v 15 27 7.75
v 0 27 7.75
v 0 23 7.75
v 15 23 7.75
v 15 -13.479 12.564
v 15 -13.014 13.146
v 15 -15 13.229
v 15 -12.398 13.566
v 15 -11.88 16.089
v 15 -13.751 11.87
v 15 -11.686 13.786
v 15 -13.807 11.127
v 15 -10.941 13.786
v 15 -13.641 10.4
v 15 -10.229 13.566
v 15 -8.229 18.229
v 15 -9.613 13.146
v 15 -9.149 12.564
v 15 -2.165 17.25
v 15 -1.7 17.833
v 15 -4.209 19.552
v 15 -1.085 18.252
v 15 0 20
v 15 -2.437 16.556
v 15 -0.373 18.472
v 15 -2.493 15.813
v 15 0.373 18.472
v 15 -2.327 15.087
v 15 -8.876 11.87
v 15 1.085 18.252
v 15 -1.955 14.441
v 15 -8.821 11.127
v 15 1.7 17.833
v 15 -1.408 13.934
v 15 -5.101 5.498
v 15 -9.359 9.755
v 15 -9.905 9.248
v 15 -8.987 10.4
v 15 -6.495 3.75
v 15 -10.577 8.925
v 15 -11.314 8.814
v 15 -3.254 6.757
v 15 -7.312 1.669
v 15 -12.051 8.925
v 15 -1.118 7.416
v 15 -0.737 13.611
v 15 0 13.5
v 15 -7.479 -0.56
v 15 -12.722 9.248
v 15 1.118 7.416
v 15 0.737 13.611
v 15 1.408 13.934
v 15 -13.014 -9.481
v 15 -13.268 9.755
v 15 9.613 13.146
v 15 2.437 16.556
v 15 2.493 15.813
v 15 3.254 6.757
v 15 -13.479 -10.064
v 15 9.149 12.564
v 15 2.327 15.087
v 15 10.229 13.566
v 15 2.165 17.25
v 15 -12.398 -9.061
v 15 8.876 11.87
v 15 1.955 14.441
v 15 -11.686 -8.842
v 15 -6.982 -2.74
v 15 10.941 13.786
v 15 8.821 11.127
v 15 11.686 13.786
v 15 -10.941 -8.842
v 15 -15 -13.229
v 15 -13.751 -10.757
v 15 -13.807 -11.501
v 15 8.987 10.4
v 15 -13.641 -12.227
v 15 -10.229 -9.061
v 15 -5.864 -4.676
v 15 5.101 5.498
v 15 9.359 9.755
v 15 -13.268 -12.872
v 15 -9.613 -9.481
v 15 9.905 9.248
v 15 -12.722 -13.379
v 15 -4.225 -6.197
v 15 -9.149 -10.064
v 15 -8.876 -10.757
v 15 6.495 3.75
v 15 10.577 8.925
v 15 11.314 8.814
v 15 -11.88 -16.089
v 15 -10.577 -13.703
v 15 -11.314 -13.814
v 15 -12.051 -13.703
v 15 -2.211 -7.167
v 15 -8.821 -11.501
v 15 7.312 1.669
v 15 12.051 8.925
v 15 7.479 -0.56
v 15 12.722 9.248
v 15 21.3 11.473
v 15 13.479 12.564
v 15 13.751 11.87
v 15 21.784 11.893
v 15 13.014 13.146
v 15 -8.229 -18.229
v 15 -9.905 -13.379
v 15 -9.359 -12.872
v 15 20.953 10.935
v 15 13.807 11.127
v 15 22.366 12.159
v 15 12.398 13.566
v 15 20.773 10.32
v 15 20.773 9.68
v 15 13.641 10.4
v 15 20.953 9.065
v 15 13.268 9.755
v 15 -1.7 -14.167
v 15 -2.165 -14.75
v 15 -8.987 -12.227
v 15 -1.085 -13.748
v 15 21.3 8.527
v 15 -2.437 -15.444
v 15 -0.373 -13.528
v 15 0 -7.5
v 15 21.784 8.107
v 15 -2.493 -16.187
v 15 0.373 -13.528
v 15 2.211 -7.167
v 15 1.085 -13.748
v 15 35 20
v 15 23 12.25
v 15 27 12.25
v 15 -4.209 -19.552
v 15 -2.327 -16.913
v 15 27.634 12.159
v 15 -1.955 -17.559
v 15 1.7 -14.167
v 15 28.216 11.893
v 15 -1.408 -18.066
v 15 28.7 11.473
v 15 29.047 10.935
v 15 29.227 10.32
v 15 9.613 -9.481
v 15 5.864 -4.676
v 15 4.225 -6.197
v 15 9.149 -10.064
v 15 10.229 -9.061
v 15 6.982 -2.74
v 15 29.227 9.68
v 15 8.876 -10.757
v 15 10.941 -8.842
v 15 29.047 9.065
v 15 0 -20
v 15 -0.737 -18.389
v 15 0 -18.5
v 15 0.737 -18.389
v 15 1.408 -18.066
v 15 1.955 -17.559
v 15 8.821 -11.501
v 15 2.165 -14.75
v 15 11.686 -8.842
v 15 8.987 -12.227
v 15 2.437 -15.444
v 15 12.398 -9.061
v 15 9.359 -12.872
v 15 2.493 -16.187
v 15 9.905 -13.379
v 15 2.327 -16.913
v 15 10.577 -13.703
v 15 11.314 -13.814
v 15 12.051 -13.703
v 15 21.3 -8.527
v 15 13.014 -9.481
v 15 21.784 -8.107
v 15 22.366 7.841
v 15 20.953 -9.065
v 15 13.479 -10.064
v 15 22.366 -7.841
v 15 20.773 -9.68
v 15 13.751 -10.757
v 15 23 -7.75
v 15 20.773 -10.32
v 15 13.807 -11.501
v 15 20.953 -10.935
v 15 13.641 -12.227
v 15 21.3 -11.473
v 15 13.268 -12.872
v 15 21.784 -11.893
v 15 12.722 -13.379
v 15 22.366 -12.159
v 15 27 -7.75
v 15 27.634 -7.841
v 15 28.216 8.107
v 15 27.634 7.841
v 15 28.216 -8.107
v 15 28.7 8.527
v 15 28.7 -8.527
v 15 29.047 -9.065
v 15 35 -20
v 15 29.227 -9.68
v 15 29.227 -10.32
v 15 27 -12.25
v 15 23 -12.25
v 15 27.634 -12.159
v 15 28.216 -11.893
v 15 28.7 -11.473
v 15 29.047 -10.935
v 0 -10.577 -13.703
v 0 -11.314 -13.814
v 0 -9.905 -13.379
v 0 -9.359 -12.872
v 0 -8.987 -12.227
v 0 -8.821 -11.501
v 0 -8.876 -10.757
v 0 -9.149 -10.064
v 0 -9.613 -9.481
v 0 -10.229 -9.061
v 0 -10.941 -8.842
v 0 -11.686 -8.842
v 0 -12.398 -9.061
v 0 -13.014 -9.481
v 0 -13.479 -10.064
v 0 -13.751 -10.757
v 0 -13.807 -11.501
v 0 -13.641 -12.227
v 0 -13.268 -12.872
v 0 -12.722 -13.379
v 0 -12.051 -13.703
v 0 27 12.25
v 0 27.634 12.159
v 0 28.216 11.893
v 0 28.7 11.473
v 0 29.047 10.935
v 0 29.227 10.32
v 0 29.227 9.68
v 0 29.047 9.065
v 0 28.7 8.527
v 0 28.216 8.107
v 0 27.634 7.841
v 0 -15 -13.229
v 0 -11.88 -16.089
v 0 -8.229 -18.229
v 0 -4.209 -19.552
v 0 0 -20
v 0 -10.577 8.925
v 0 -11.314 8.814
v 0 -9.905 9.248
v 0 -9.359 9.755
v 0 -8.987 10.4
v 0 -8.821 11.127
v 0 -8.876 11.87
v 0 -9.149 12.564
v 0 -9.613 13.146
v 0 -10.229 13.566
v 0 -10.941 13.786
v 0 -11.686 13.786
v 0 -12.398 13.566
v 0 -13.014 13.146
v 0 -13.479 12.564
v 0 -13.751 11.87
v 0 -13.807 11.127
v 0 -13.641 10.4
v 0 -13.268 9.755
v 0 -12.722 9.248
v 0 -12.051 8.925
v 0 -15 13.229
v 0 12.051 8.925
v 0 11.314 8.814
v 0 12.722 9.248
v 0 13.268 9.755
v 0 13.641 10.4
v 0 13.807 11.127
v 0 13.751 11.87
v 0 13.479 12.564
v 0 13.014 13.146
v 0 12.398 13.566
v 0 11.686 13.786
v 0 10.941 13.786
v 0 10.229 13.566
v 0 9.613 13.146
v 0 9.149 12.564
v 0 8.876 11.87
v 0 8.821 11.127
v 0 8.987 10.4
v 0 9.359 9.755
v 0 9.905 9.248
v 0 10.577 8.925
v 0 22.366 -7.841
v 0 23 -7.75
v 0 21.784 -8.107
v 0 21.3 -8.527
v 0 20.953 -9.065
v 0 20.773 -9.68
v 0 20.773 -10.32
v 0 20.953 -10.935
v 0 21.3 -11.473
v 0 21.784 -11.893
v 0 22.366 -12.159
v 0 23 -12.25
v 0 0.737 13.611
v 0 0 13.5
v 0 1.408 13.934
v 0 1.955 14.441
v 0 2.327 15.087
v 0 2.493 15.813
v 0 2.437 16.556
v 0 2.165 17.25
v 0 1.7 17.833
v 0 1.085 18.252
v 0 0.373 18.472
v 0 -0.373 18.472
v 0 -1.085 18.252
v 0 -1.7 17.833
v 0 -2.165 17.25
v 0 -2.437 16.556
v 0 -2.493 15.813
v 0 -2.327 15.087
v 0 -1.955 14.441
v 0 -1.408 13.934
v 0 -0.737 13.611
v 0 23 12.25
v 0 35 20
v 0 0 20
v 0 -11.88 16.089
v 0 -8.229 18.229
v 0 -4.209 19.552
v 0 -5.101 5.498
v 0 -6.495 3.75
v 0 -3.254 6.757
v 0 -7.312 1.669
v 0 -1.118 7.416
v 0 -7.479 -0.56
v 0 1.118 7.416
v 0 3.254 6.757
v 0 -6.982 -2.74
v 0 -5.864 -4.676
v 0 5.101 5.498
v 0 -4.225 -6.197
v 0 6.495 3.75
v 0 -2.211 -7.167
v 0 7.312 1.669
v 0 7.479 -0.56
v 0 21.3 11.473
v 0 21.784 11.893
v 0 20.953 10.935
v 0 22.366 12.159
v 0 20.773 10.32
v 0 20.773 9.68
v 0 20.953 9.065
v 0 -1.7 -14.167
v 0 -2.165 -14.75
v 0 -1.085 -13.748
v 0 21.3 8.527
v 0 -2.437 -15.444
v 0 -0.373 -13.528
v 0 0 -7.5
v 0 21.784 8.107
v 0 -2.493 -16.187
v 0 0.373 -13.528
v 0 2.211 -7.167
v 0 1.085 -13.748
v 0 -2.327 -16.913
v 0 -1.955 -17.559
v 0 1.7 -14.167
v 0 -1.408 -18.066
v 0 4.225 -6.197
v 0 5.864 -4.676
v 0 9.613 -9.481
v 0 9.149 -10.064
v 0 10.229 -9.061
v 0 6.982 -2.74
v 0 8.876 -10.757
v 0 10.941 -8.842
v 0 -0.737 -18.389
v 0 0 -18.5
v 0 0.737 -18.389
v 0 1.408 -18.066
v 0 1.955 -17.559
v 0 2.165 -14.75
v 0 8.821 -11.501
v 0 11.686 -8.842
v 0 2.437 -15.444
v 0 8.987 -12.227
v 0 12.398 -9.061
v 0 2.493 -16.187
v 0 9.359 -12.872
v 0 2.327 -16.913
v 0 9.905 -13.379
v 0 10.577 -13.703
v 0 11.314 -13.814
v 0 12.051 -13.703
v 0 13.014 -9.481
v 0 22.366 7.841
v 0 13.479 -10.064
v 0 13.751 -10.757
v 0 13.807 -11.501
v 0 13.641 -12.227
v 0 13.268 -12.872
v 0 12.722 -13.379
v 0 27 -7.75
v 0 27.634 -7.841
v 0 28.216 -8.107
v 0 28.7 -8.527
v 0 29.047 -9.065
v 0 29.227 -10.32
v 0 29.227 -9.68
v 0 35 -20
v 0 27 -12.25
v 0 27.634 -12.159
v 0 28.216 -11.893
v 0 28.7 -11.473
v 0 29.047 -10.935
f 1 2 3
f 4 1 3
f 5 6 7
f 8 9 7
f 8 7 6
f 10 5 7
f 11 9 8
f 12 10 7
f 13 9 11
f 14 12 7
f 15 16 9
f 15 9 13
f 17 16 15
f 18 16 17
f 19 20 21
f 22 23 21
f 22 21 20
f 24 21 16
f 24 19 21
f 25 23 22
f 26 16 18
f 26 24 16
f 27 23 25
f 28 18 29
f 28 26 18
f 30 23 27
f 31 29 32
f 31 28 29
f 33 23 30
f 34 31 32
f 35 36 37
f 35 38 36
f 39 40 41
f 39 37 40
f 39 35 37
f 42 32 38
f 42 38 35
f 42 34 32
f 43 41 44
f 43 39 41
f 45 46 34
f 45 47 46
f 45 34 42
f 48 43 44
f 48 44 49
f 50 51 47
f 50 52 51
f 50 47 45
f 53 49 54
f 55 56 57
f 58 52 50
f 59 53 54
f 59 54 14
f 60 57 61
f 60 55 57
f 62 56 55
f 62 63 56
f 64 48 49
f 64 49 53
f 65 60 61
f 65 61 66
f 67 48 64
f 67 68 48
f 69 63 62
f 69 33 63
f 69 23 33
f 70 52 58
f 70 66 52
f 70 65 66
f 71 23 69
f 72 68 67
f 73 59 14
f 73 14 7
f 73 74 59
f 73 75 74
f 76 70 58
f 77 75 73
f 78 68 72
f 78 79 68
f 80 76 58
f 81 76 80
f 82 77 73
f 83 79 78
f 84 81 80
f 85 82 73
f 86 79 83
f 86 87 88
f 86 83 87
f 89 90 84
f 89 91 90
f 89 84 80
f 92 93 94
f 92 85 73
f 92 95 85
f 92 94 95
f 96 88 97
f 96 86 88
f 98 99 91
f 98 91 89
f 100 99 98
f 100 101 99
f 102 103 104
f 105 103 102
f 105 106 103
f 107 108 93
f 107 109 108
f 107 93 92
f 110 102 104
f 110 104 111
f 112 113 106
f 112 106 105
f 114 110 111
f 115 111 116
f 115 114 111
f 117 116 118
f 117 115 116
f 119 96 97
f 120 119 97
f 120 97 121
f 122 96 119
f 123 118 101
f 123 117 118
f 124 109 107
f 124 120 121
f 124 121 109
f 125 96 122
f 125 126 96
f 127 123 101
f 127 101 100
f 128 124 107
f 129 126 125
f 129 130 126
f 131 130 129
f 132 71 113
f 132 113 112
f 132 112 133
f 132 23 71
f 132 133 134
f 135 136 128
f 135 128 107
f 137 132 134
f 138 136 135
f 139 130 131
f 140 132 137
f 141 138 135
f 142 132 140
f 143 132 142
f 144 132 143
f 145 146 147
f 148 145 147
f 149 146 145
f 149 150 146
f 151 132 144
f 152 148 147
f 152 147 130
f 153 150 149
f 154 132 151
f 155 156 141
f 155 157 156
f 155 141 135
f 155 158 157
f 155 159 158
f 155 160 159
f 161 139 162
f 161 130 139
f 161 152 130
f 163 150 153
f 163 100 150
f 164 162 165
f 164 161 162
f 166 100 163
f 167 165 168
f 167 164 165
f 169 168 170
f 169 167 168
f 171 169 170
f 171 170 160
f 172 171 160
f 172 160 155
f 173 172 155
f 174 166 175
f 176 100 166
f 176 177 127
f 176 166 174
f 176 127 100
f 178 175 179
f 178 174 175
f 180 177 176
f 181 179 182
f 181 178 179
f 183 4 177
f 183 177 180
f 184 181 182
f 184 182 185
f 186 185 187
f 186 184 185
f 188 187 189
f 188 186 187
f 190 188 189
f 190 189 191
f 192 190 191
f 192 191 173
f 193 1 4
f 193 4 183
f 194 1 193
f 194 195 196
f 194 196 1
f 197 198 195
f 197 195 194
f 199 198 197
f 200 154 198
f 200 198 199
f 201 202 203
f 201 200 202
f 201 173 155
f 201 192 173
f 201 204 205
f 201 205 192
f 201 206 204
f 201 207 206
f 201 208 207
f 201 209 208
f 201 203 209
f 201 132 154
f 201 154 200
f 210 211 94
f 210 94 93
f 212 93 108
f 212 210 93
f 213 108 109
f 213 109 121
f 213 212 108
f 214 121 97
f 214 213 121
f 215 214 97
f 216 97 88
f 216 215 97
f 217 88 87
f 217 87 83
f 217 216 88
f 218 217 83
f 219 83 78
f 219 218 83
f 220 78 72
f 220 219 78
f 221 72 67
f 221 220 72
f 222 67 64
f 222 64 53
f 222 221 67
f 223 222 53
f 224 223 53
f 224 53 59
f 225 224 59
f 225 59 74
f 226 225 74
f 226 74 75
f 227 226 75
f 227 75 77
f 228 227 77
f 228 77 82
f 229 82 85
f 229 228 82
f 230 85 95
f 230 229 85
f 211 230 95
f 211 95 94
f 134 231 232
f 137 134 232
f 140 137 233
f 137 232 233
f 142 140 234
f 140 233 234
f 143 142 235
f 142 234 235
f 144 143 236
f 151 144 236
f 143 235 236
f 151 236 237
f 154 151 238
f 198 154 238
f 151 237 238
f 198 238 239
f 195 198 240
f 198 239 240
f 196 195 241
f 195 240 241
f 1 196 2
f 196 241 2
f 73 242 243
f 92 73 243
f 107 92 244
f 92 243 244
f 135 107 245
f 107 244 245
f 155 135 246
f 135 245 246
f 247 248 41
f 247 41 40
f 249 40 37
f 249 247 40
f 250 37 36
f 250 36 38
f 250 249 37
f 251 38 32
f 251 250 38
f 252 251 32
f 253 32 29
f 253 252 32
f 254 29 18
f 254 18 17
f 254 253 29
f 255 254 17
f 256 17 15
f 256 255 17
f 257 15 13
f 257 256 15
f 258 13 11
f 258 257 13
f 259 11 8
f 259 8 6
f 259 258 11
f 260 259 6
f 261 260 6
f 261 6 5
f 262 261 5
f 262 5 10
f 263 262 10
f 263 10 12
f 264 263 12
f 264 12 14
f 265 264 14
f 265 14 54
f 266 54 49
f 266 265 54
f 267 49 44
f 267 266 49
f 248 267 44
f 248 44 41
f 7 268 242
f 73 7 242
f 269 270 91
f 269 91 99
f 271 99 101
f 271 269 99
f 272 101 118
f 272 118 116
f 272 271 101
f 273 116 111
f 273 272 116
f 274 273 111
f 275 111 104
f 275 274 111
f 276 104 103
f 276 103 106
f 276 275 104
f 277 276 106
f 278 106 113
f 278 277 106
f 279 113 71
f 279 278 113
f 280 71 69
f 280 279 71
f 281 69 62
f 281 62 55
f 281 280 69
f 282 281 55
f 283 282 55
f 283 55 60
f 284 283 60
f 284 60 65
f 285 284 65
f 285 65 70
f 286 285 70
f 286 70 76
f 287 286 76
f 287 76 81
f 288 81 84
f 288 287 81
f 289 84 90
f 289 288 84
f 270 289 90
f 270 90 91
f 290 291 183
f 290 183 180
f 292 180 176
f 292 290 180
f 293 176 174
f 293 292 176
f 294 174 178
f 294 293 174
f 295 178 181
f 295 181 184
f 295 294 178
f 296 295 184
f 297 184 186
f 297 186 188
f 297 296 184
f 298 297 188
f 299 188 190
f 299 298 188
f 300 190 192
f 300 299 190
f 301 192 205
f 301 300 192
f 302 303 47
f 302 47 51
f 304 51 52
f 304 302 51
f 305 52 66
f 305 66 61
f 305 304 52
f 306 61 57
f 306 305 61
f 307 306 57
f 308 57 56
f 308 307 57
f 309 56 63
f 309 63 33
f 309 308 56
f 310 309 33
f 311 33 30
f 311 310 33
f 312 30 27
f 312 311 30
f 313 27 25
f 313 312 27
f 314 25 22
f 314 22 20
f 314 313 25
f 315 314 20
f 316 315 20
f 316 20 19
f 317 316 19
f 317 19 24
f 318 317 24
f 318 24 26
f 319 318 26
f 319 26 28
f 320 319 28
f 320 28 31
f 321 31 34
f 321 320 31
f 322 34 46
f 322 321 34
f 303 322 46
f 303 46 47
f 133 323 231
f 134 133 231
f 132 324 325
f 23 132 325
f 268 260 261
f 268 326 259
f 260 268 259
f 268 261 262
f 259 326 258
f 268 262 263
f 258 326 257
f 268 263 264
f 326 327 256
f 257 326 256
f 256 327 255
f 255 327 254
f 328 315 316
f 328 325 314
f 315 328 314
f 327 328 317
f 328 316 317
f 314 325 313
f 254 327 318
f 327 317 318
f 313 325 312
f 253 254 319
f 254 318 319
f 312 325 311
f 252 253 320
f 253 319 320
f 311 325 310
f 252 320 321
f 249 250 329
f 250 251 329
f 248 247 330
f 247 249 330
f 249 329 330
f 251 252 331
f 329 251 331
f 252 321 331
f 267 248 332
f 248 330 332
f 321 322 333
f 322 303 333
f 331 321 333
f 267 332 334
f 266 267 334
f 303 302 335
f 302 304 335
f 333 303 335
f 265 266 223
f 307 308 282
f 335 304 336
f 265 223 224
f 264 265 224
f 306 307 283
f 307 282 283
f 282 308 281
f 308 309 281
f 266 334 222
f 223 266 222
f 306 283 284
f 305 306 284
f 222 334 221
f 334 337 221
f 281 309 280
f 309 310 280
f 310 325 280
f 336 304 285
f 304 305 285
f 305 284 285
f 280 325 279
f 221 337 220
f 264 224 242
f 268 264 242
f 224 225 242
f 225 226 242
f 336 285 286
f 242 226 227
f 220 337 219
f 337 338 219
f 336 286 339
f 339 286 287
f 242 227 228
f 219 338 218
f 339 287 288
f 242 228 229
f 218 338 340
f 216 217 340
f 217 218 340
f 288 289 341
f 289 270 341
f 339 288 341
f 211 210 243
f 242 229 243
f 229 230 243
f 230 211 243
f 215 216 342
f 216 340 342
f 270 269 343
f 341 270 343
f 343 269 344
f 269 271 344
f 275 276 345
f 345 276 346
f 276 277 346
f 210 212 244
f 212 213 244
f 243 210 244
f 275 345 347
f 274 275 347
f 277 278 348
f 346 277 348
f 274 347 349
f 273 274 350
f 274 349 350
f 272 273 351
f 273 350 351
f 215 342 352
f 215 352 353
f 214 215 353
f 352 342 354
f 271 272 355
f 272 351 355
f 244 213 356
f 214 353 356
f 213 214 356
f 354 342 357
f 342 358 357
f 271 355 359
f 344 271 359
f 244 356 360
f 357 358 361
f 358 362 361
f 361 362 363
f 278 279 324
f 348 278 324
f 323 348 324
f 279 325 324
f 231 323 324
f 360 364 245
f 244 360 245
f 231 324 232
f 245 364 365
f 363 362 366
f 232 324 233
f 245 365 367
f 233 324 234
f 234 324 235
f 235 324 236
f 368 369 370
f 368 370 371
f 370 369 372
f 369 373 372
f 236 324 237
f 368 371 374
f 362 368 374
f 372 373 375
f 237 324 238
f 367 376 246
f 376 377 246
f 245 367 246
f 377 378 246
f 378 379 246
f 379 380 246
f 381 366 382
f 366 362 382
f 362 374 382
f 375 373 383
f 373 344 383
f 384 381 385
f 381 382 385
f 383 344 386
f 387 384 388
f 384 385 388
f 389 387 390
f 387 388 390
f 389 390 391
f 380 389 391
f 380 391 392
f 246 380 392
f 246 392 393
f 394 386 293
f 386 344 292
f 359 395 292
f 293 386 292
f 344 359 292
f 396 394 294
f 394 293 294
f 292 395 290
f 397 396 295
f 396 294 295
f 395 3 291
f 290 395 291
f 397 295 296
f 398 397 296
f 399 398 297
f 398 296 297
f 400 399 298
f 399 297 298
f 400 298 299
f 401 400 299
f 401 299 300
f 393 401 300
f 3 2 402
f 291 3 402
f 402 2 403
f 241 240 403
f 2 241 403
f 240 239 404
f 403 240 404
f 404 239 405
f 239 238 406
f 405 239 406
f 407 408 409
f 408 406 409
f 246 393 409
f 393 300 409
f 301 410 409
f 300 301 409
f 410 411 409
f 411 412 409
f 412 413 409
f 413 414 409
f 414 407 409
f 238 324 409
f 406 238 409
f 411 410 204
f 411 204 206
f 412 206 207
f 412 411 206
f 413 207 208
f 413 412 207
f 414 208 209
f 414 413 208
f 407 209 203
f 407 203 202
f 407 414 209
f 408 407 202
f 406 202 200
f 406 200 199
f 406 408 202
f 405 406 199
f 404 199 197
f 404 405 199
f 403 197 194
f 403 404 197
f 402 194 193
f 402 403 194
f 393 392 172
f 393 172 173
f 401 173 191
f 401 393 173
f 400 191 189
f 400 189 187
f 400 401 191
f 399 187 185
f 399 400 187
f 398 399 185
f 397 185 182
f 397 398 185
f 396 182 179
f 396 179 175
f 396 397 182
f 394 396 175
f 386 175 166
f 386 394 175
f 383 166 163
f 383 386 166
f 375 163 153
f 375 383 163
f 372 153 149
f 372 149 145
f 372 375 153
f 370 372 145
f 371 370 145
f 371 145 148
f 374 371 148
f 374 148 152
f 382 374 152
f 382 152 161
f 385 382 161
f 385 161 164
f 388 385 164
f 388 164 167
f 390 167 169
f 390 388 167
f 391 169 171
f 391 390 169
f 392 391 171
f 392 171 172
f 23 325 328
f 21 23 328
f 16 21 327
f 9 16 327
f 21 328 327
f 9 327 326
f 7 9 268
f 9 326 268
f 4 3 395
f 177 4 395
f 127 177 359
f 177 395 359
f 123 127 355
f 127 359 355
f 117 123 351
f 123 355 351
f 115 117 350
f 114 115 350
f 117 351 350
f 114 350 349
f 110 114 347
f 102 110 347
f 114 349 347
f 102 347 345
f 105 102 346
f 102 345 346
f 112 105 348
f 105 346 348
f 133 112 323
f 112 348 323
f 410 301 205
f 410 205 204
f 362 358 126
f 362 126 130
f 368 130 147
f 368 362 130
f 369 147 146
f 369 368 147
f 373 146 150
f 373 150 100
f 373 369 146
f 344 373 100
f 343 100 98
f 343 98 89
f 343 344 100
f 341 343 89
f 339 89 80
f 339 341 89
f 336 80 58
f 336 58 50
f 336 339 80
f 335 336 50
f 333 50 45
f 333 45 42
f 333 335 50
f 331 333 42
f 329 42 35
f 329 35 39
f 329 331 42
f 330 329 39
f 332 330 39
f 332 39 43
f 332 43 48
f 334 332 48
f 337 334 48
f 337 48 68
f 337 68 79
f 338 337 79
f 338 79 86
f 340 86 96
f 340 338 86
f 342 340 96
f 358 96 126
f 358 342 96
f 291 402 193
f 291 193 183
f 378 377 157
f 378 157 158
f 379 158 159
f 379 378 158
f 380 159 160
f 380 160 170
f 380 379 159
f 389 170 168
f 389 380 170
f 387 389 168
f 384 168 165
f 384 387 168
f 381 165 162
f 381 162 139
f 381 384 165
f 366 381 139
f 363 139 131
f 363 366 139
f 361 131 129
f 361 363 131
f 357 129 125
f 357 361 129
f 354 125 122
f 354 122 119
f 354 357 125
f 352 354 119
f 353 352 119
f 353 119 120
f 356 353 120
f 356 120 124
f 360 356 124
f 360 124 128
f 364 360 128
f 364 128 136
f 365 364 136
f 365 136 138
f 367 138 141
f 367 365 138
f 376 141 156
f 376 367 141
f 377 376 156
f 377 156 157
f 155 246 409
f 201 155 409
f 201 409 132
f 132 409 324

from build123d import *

# Parameters (mm, degrees)
SKETCH1_R           = 7.5
SKETCH1_R_2         = 2.5
BOSS_EXTRUDE1_DEPTH = 15


with BuildPart() as part:
    # Sketch1 → Boss-Extrude1 (new body)
    with BuildSketch(Plane(origin=(0, 0, 0), x_dir=(0, 0, -1), z_dir=(1, 0, 0))):
        with BuildLine():
            Line((-13.228756555, -15), (13.228756555, -15))
            ThreePointArc((13.228756555, -15), (18.228756555, -8.228756555), (20, 0))
            Line((20, 0), (20, 35))
            Line((20, 35), (-20, 35))
            Line((-20, 35), (-20, 0))
            ThreePointArc((-20, 0), (-18.228756555, -8.228756555), (-13.228756555, -15))
        make_face()
        Circle(SKETCH1_R, mode=Mode.SUBTRACT)
        with Locations((16, 0)):
            Circle(SKETCH1_R_2, mode=Mode.SUBTRACT)
        with Locations((11.313708499, -11.313708499)):
            Circle(SKETCH1_R_2, mode=Mode.SUBTRACT)
        with Locations((-11.313708499, -11.313708499)):
            Circle(SKETCH1_R_2, mode=Mode.SUBTRACT)
        with Locations((-16, 0)):
            Circle(SKETCH1_R_2, mode=Mode.SUBTRACT)
        with Locations((-11.313708499, 11.313708499)):
            Circle(SKETCH1_R_2, mode=Mode.SUBTRACT)
        with Locations((11.313708499, 11.313708499)):
            Circle(SKETCH1_R_2, mode=Mode.SUBTRACT)
        with BuildLine():
            Line((-12.25, 23), (-12.25, 27))
            ThreePointArc((-12.25, 27), (-10, 29.25), (-7.75, 27))
            Line((-7.75, 27), (-7.75, 23))
            ThreePointArc((-7.75, 23), (-10, 20.75), (-12.25, 23))
        make_face(mode=Mode.SUBTRACT)
        with BuildLine():
            Line((12.25, 23), (12.25, 27))
            ThreePointArc((12.25, 27), (10, 29.25), (7.75, 27))
            Line((7.75, 27), (7.75, 23))
            ThreePointArc((7.75, 23), (10, 20.75), (12.25, 23))
        make_face(mode=Mode.SUBTRACT)
    extrude(amount=BOSS_EXTRUDE1_DEPTH)


solid = part.part
